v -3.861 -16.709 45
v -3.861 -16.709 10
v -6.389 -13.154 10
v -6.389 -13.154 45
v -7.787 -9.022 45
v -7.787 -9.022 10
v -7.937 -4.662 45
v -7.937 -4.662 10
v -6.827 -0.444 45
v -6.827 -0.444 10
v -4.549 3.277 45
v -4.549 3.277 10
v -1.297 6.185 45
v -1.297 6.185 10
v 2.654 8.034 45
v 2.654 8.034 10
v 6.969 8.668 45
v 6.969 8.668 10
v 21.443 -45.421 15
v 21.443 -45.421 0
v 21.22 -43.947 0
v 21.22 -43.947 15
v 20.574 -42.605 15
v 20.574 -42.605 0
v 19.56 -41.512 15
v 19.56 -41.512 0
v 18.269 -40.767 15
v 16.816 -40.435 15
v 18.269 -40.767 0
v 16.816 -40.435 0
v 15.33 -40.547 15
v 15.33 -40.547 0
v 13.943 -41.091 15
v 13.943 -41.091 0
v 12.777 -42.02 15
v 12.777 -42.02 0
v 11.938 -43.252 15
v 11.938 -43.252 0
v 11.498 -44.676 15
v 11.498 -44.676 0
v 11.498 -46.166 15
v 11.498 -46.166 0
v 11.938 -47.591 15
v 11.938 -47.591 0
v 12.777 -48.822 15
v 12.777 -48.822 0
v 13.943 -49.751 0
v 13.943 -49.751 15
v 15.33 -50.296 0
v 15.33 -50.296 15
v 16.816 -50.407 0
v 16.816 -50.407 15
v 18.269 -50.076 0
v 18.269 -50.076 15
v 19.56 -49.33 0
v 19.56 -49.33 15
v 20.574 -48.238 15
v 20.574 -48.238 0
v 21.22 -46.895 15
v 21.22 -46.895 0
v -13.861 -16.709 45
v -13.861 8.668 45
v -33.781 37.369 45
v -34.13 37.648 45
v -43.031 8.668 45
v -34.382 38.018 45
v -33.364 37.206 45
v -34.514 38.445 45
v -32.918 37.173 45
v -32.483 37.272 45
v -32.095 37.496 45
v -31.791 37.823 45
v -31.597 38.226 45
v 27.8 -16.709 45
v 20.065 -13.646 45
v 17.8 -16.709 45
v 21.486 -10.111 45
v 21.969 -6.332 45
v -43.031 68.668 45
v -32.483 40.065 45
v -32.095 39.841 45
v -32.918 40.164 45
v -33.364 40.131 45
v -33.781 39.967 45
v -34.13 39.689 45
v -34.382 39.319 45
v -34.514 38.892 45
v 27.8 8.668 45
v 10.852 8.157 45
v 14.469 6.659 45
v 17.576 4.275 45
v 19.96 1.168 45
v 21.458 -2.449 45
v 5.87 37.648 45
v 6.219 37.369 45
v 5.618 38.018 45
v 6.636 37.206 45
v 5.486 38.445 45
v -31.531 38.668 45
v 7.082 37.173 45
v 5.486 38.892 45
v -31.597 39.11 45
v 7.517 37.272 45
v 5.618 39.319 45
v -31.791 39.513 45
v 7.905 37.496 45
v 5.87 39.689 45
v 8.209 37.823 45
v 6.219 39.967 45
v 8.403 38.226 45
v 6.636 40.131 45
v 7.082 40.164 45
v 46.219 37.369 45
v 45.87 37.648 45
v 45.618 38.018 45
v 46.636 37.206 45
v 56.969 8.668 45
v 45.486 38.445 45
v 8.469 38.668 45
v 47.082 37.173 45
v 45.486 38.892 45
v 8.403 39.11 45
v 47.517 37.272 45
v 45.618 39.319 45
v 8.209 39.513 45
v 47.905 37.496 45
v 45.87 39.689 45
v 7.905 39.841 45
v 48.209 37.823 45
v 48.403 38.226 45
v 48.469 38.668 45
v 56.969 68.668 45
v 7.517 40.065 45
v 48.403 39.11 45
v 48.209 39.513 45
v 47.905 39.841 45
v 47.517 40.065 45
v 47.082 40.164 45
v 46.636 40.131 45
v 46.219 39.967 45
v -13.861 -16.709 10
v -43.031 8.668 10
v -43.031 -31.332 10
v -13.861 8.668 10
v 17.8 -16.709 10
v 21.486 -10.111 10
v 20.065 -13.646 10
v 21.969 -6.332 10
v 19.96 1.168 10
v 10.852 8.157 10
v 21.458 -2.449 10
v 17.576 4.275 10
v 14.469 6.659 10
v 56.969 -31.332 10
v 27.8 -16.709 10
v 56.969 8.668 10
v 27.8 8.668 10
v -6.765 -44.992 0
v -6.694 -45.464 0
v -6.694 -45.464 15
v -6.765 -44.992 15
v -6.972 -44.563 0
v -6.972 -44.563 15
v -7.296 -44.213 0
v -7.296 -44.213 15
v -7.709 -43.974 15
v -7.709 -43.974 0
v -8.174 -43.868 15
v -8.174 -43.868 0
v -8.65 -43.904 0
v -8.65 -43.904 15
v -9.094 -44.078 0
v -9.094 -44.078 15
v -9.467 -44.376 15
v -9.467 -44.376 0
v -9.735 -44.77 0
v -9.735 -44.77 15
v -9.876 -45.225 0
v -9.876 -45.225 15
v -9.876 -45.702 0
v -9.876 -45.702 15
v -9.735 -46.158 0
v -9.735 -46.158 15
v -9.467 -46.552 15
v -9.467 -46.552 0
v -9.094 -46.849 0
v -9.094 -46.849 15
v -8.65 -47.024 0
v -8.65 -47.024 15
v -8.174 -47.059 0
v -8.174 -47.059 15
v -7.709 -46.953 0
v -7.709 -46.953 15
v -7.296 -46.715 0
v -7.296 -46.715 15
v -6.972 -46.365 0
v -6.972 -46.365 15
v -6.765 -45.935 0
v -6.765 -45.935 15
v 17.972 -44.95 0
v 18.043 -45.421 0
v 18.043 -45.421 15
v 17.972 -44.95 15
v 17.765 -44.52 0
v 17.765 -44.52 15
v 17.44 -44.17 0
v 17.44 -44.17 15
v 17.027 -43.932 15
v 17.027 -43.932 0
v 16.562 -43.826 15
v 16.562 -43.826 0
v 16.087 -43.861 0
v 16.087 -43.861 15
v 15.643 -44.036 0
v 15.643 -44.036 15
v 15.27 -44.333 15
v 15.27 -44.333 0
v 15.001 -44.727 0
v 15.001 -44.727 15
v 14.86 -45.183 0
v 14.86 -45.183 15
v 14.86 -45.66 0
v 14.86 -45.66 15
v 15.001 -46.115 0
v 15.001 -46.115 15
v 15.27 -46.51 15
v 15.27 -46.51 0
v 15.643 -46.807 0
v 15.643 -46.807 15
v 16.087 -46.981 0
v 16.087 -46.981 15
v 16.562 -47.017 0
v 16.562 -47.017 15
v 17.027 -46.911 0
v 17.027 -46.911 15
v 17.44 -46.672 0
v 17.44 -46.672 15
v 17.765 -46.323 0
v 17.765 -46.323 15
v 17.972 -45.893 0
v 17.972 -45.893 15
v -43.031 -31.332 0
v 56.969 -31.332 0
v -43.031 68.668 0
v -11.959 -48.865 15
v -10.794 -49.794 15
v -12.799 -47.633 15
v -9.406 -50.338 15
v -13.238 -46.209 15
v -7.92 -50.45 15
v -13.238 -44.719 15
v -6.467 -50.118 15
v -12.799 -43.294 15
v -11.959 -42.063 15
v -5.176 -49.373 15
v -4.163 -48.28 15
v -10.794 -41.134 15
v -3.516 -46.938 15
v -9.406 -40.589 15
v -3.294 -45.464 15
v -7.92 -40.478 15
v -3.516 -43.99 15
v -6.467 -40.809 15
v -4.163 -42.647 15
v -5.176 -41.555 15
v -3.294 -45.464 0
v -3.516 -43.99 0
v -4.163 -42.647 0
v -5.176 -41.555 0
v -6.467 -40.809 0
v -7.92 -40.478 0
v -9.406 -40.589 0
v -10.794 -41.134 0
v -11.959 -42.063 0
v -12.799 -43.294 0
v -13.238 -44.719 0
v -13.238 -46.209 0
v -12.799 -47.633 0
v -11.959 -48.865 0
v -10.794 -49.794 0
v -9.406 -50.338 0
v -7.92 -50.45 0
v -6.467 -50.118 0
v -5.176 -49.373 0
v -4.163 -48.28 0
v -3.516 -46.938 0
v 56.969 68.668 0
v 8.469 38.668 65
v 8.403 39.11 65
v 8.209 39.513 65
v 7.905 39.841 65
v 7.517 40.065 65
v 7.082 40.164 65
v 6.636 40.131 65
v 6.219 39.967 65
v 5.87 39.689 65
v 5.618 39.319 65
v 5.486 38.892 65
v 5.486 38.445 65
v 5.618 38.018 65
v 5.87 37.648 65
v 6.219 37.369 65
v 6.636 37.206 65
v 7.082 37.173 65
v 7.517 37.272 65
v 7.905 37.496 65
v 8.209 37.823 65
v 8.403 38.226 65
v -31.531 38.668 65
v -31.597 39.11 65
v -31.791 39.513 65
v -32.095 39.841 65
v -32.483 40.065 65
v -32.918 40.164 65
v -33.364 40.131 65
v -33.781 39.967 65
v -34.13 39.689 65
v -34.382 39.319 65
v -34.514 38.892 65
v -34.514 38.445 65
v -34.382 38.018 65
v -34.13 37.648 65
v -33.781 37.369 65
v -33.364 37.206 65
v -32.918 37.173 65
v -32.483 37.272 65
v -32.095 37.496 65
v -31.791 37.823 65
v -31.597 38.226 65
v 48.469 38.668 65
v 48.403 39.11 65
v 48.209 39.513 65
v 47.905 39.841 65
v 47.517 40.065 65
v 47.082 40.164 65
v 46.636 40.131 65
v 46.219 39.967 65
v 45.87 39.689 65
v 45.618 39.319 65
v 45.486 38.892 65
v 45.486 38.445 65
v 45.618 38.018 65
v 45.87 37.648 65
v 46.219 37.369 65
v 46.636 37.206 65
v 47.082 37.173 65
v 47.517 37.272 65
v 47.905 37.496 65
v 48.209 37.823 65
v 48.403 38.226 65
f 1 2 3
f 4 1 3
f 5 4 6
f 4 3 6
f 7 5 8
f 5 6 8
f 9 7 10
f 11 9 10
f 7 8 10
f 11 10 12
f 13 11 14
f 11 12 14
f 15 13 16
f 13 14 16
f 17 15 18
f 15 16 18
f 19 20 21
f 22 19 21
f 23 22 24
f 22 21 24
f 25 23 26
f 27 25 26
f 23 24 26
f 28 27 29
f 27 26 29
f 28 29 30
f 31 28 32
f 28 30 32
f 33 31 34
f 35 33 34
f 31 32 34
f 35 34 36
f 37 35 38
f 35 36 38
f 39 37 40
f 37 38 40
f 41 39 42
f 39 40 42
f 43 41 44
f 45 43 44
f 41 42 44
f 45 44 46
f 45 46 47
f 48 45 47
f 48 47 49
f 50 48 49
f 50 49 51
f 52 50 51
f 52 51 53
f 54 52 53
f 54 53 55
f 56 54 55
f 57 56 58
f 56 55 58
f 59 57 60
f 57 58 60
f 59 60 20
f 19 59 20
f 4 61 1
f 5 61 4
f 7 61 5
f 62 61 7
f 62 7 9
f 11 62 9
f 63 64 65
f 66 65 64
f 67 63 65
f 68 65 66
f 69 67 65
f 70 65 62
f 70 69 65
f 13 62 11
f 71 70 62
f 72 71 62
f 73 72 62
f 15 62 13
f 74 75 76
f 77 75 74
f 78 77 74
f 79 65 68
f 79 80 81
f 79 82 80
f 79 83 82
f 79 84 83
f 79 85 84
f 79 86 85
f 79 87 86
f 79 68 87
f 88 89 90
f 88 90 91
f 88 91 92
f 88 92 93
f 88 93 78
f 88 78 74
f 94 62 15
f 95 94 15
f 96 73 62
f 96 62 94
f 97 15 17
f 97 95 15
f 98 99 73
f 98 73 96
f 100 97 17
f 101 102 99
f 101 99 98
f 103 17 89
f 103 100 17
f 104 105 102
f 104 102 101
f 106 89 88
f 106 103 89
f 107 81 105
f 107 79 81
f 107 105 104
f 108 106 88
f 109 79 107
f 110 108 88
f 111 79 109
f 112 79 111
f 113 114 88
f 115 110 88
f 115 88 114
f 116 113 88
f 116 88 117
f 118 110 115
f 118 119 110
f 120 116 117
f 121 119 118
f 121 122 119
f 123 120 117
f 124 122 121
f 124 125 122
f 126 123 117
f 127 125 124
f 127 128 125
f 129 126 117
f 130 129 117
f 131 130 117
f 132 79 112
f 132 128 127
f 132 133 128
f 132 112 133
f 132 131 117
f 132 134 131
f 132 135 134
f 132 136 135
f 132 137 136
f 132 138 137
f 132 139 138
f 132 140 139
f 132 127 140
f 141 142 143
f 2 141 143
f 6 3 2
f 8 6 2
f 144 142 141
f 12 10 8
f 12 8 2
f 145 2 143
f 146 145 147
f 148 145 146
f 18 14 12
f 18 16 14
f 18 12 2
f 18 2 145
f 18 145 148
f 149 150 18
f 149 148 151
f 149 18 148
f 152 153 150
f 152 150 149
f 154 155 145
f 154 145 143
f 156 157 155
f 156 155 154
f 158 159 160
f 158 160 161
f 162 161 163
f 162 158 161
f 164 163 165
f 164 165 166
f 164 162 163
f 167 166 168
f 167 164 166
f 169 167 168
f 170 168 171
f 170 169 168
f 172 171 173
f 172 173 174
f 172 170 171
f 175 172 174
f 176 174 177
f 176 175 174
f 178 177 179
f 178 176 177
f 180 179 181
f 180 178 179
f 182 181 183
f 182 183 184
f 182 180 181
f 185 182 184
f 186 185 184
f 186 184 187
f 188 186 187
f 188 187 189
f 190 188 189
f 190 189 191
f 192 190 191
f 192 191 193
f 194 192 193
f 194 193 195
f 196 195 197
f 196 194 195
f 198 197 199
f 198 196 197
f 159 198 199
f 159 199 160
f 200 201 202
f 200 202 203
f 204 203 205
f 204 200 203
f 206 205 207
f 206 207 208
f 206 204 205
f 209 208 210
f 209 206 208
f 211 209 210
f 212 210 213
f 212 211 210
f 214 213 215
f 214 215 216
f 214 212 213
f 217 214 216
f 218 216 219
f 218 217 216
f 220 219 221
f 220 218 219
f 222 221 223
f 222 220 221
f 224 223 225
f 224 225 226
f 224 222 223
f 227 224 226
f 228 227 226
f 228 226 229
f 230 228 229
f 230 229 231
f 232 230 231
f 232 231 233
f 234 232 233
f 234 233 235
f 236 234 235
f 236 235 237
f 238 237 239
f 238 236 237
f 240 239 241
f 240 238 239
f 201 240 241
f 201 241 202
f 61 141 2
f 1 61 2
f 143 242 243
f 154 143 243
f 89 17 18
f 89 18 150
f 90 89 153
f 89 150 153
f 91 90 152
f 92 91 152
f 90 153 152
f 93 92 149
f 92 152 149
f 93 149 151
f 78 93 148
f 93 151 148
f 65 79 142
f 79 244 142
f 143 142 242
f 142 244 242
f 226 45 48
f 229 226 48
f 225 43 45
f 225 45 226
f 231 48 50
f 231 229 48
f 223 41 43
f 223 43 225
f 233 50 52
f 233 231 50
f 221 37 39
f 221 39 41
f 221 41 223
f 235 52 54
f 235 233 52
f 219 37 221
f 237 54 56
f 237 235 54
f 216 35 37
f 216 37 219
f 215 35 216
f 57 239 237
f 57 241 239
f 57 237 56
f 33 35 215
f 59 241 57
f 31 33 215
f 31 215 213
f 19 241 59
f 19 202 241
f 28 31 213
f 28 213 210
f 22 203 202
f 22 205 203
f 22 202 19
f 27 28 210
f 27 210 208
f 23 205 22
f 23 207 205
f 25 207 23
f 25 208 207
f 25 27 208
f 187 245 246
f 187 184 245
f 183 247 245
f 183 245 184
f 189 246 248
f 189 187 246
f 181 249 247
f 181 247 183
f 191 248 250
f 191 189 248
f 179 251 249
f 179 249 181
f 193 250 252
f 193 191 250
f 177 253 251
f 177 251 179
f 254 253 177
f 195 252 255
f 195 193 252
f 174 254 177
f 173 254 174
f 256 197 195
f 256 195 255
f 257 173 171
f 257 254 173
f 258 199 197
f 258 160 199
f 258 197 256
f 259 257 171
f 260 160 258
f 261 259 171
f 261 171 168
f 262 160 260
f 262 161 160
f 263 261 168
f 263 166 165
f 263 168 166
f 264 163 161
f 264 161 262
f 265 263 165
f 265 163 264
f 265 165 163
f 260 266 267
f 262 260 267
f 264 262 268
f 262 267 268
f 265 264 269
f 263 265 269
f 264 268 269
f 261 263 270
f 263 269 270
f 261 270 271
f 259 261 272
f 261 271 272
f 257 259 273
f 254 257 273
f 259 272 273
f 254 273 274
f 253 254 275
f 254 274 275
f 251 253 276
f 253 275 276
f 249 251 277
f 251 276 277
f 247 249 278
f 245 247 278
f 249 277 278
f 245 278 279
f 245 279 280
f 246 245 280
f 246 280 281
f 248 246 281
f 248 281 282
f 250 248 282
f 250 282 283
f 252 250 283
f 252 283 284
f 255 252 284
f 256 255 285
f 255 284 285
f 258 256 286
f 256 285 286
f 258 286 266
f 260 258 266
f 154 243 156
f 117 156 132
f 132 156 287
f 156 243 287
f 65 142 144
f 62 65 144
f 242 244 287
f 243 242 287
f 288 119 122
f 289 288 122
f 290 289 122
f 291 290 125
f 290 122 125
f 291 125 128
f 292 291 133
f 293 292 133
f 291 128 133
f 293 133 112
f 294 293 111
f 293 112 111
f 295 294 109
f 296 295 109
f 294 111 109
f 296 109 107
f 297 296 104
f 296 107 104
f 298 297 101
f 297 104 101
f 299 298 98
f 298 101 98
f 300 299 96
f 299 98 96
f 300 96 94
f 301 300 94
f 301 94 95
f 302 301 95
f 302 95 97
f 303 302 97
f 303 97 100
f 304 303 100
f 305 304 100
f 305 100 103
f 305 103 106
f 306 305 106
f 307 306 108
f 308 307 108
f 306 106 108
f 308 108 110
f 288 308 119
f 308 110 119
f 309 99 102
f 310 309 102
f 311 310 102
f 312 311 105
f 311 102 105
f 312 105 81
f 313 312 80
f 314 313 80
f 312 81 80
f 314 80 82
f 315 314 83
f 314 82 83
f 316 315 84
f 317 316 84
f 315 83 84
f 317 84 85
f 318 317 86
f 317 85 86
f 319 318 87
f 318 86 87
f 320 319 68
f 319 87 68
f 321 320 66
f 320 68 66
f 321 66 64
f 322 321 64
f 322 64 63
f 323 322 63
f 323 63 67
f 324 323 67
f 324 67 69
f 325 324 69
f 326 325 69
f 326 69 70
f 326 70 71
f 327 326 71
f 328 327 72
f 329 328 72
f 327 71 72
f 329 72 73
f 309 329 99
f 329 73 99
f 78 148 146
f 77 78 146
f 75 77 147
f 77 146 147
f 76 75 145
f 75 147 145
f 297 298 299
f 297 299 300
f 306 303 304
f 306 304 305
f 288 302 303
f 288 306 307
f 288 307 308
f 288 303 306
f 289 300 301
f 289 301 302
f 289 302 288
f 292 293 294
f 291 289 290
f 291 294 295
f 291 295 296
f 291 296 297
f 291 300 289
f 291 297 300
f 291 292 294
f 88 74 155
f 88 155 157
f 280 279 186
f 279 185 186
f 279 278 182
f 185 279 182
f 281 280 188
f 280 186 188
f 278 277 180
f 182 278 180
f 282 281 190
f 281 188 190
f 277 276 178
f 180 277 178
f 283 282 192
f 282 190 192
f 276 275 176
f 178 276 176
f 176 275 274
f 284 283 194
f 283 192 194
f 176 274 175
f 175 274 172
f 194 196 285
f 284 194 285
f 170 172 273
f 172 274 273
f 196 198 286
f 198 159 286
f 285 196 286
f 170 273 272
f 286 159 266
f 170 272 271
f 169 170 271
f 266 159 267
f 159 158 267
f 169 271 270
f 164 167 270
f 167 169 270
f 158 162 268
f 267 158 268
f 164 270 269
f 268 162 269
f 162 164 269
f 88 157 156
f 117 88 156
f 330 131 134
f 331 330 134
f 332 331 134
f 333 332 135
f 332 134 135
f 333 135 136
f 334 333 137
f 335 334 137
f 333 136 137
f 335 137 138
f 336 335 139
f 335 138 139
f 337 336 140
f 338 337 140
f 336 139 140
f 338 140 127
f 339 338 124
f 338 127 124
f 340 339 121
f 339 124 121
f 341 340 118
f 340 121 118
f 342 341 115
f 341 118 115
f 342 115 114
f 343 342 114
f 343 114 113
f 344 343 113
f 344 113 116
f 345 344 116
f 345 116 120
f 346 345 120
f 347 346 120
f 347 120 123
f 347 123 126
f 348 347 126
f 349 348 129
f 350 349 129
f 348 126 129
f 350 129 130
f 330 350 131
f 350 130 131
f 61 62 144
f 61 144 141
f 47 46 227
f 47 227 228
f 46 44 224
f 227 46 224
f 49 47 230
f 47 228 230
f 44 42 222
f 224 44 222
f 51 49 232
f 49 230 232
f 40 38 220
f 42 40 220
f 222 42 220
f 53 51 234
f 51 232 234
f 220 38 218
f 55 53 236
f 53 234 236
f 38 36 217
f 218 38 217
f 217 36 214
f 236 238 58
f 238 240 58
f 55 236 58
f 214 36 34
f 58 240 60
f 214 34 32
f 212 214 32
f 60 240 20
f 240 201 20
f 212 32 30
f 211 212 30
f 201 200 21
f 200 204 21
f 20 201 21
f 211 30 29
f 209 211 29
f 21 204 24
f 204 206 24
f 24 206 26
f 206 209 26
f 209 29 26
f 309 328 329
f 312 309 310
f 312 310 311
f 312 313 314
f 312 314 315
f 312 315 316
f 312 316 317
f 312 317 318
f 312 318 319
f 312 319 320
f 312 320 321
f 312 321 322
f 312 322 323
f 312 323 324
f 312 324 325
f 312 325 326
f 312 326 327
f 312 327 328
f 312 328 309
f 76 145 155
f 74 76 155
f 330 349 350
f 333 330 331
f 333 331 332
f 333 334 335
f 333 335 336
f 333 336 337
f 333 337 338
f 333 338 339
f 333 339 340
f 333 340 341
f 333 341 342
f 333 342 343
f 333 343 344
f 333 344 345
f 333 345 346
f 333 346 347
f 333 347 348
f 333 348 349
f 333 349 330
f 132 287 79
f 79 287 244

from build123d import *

# Parameters (mm, degrees)
F0_W     = 100
F0_H     = 100
F1_DEPTH = 10
F3_DEPTH = 35
F4_R     = 1.5
F5_DEPTH = 20
F0_R     = 5
F0_R_2   = 1.6
F6_DEPTH = 15


with BuildPart() as f1:
    # F0 (on Top) → F1 (new body)
    with BuildSketch(Plane.XY):
        with Locations((6.96941, 18.668353)):
            Rectangle(F0_W, F0_H)
    extrude(amount=F1_DEPTH)

    # F2 (on face) → F3 (join)
    with BuildSketch(Plane.XY.offset(10)):
        Polygon((56.96941, 68.668353), (-43.03059, 68.668353), (-43.03059, 8.668353), (-13.861457, 8.668353), (6.96941, 8.668353), (27.800277, 8.668353), (56.96941, 8.668353), align=None)
        with BuildLine():
            Line((6.96941, 8.668353), (-13.861457, 8.668353))
            Line((-13.861457, 8.668353), (-13.861457, -16.709138))
            Line((-13.861457, -16.709138), (-3.861457, -16.709138))
            ThreePointArc((-3.861457, -16.709138), (-6.826647, -0.443624), (6.96941, 8.668353))
        make_face()
        with BuildLine():
            Line((27.800277, -16.709138), (27.800277, 8.668353))
            Line((27.800277, 8.668353), (6.96941, 8.668353))
            ThreePointArc((6.96941, 8.668353), (17.576012, 4.274955), (21.96941, -6.331647))
            ThreePointArc((21.96941, -6.331647), (20.888157, -11.923472), (17.800277, -16.709138))
            Line((17.800277, -16.709138), (27.800277, -16.709138))
        make_face()
    extrude(amount=F3_DEPTH)

    # F4 (on face) → F5 (join)
    with BuildSketch(Plane.XY.offset(45)):
        with Locations((-33.03059, 38.668353)):
            Circle(F4_R)
        with Locations((6.96941, 38.668353)):
            Circle(F4_R)
        with Locations((46.96941, 38.668353)):
            Circle(F4_R)
    extrude(amount=F5_DEPTH)


with BuildPart() as f6:
    # F0 (on Top) → F6 (new body)
    with BuildSketch(Plane.XY):
        with Locations((-8.293748, -45.463823)):
            Circle(F0_R)
        with Locations((-8.293748, -45.463823)):
            Circle(F0_R_2, mode=Mode.SUBTRACT)
        with Locations((16.442623, -45.421229)):
            Circle(F0_R)
        with Locations((16.442623, -45.421229)):
            Circle(F0_R_2, mode=Mode.SUBTRACT)
    extrude(amount=F6_DEPTH)


solid = Compound([f1.part, f6.part])
